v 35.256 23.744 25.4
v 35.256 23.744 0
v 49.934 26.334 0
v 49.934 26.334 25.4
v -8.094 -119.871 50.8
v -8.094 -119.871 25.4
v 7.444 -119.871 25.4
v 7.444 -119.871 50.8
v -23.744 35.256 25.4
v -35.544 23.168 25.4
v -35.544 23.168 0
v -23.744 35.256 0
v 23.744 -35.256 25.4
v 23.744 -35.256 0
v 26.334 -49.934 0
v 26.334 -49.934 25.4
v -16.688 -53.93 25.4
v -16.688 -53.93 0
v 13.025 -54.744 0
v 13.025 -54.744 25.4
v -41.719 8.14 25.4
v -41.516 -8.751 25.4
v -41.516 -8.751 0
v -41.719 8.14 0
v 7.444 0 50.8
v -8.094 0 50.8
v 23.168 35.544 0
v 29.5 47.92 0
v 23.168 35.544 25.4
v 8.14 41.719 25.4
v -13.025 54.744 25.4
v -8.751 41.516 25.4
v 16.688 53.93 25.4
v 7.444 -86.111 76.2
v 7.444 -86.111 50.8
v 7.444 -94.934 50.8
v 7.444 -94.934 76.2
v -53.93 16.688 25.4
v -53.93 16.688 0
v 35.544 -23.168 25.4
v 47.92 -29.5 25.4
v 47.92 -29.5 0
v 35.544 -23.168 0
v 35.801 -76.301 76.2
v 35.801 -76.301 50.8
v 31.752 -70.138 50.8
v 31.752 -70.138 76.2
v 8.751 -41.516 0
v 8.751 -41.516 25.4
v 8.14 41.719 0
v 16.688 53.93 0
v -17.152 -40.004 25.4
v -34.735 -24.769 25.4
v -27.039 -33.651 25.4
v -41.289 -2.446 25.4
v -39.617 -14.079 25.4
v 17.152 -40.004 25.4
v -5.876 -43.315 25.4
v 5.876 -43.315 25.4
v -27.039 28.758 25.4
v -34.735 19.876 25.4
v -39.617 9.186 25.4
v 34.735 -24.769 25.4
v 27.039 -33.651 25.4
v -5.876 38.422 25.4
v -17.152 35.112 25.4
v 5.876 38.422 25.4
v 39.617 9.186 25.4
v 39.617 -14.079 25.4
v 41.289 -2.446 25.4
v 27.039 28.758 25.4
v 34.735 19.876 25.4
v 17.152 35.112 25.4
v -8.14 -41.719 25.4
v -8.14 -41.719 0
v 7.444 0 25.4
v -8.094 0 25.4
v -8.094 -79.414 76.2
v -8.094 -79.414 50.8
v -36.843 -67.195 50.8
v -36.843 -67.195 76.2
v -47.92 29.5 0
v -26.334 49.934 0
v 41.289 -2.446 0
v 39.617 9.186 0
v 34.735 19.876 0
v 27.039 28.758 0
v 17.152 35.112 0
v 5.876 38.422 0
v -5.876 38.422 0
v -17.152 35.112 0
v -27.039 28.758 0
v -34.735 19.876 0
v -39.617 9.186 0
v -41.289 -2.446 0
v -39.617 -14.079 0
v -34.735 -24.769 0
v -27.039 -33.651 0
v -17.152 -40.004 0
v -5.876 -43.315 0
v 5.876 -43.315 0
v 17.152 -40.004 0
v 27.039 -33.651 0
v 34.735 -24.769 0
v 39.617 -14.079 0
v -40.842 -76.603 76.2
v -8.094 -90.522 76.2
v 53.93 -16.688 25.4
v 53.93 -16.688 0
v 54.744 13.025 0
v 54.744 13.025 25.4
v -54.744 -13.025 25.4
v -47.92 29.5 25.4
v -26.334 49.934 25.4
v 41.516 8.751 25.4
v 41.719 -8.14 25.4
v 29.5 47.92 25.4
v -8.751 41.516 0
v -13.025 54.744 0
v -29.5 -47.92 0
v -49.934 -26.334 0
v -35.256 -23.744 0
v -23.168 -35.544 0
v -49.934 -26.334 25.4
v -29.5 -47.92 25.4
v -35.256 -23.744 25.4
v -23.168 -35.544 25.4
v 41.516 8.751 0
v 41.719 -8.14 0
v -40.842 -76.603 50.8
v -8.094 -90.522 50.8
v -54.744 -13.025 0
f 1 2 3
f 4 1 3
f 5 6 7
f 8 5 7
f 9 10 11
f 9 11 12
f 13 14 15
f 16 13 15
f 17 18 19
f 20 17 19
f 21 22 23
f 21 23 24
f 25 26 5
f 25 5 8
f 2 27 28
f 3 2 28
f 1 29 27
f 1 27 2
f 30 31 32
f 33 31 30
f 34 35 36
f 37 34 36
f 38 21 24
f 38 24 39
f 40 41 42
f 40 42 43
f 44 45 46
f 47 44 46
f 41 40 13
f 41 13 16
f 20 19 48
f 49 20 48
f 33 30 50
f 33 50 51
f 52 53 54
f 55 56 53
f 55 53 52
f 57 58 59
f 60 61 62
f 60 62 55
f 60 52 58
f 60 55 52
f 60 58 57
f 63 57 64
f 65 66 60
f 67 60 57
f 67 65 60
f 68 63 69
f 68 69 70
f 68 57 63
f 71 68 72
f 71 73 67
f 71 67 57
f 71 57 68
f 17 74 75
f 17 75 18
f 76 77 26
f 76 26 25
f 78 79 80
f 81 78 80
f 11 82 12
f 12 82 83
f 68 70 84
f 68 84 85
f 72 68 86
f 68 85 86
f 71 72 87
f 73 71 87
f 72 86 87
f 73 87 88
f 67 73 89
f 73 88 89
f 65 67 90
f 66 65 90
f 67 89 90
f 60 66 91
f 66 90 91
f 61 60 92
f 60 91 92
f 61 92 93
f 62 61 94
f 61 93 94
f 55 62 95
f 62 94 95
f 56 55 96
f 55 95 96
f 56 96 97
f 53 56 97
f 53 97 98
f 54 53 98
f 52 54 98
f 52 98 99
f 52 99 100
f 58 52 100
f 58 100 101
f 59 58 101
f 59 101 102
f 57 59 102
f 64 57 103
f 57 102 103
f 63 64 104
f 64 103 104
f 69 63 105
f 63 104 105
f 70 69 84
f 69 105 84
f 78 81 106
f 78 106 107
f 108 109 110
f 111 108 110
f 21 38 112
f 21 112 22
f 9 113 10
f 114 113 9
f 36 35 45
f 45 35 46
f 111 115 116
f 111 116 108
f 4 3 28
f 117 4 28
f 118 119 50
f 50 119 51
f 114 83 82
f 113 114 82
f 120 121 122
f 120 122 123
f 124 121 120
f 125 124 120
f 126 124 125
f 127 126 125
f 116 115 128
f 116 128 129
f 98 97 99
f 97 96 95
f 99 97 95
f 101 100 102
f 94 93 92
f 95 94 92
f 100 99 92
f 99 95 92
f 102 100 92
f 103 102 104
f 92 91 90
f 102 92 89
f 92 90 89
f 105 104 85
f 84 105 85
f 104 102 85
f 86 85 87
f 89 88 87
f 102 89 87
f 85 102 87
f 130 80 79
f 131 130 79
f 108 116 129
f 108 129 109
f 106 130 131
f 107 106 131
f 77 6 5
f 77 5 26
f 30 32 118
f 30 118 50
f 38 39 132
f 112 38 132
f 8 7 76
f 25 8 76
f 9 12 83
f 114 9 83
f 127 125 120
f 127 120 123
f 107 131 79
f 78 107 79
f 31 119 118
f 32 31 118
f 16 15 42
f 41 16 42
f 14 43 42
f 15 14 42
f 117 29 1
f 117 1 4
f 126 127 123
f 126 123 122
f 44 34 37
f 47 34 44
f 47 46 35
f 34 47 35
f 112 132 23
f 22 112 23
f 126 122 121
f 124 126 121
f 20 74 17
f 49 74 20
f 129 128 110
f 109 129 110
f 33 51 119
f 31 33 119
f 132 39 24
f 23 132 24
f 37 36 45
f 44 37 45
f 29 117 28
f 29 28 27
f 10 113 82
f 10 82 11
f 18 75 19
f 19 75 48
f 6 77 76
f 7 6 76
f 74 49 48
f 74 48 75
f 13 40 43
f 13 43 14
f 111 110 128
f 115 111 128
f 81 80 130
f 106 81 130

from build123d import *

# Parameters (mm, degrees)
F2_DEPTH = 25.4
F0_R     = 41.289093
F3_DEPTH = 25.4
F4_W     = 15.537881
F4_H     = 119.8714
F5_DEPTH = 25.4
F7_DEPTH = 25.4


with BuildPart() as f2:
    # F1 (on Top) → F2 (new body)
    with BuildSketch(Plane.XY):
        Polygon((26.334228, -49.934298), (47.919661, -29.500088), (35.544012, -23.168363), (23.743974, -35.256207), align=None)
        Polygon((53.929992, -16.687769), (54.744029, 13.024605), (41.515918, 8.750905), (41.719428, -8.140378), align=None)
        Polygon((16.687769, 53.929992), (-13.024605, 54.744029), (-8.750905, 41.515918), (8.140378, 41.719428), align=None)
        Polygon((-26.334228, 49.934298), (-47.919661, 29.500088), (-35.544012, 23.168363), (-23.743974, 35.256207), align=None)
        Polygon((-53.929992, 16.687769), (-54.744029, -13.024605), (-41.515918, -8.750905), (-41.719428, 8.140378), align=None)
        Polygon((-49.934298, -26.334228), (-29.500088, -47.919661), (-23.168363, -35.544012), (-35.256207, -23.743974), align=None)
        Polygon((-16.687769, -53.929992), (13.024605, -54.744029), (8.750905, -41.515918), (-8.140378, -41.719428), align=None)
        Polygon((29.500088, 47.919661), (23.168363, 35.544012), (35.256207, 23.743974), (49.934298, 26.334228), align=None)
    extrude(amount=F2_DEPTH)


with BuildPart() as f3:
    # F0 (on Top) → F3 (new body)
    with BuildSketch(Plane.XY):
        with Locations((0, -2.446349)):
            Circle(F0_R)
    extrude(amount=F3_DEPTH)


with BuildPart() as f5:
    # F4 (on face) → F5 (new body)
    with BuildSketch(Plane.XY.offset(25.4)):
        with Locations((-0.325354, -59.9357)):
            Rectangle(F4_W, F4_H)
    extrude(amount=F5_DEPTH)


with BuildPart() as f7:
    # F6 (on face) → F7 (new body)
    with BuildSketch(Plane.XY.offset(50.8)):
        Polygon((31.752183, -70.138319), (7.443586, -86.110997), (7.443586, -94.933805), (35.801264, -76.300559), align=None)
        Polygon((-8.094295, -90.522401), (-8.094295, -79.41404), (-36.842734, -67.194842), (-40.841761, -76.603462), align=None)
    extrude(amount=F7_DEPTH)


solid = Compound([f2.part, f3.part, f5.part, f7.part])
